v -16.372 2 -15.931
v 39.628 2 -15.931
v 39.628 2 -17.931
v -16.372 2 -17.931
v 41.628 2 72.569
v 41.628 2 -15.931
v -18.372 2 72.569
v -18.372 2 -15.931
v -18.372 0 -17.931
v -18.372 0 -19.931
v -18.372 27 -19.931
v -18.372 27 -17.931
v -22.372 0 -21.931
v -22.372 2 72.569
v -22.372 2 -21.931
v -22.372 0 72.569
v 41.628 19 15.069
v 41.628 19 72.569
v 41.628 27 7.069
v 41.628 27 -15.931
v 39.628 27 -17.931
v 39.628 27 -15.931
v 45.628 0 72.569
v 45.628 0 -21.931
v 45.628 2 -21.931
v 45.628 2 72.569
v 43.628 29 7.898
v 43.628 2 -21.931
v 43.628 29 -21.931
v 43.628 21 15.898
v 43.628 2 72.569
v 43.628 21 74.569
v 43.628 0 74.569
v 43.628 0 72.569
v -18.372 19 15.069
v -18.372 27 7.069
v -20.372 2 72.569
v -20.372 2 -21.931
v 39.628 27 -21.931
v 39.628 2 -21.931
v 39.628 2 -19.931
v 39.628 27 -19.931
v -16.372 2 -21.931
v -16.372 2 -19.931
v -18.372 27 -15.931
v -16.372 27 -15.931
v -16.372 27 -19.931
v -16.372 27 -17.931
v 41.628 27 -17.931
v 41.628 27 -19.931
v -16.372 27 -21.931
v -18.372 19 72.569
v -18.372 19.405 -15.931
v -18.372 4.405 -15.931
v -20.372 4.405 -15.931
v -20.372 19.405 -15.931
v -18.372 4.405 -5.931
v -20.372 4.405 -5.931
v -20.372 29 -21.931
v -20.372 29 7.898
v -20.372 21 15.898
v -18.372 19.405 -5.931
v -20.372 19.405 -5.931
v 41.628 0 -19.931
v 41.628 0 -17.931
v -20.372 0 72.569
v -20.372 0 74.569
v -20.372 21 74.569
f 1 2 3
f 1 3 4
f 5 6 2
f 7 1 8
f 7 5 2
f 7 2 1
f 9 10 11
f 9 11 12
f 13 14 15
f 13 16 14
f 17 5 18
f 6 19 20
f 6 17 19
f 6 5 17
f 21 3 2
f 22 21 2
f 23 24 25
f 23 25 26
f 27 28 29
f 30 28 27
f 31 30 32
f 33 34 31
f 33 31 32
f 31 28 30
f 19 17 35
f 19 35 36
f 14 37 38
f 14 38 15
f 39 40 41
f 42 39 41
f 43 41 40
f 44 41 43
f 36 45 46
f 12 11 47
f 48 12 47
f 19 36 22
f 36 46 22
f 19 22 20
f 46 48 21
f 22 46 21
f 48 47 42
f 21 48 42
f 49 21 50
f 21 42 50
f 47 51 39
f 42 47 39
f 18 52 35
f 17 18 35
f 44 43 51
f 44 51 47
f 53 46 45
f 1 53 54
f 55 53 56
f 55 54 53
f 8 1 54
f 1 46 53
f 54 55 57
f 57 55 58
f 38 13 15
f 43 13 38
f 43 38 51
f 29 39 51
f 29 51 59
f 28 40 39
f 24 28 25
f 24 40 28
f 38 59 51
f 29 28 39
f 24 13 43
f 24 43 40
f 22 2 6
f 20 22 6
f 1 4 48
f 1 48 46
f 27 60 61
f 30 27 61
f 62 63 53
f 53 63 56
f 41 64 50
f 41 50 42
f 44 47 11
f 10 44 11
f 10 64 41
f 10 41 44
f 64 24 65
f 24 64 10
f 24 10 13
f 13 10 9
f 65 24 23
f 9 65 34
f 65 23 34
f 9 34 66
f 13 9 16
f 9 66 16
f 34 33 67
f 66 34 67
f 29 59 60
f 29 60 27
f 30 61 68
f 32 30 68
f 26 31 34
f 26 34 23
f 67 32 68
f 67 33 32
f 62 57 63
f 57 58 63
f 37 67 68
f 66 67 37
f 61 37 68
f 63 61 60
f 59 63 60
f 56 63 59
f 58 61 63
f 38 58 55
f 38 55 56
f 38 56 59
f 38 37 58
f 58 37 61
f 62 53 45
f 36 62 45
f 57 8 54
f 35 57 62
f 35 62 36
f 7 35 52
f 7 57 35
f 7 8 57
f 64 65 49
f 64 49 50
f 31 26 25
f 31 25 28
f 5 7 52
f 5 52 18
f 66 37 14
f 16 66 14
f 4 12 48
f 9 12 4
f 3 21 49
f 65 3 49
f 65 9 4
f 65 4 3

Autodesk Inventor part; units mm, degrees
sketch "Sketch1" plane through (0, 0, 0) normal (0, 1, 0) x (-1, 0, 0)
  line L0 (22.3723, -21.9307) -> (-45.6277, -21.9307)
  line L1 (-45.6277, -21.9307) -> (-45.6277, 74.5693)
  line L2 (-45.6277, 74.5693) -> (22.3723, 74.5693)
  line L3 (22.3723, 74.5693) -> (22.3723, -21.9307)
  point P0 (0, 0)
  dimension "d0" = 68
  dimension "d1" = 96.5
extrude "Extrusion1" add sketch "Sketch1" along normal blind 2
sketch "Sketch3" plane through (0, 2, 0) normal (0, 1, 0) x (1, 0, 0)
  line L0 (-20.3723, 21.9307) -> (43.6277, 21.9307)
  line L1 (43.6277, 21.9307) -> (43.6277, -72.5693)
  line L2 (-20.3723, -72.5693) -> (-20.3723, 21.9307)
  line L3 (45.6277, 21.9307) -> (-22.3723, 21.9307) projected
  line L4 (-22.3723, 21.9307) -> (-22.3723, -74.5693) projected
  line L5 (-22.3723, -74.5693) -> (45.6277, -74.5693) projected
  line L6 (45.6277, -74.5693) -> (45.6277, 21.9307) projected
  line L7 (-20.3723, -72.5693) -> (-20.3723, -74.5693)
  line L8 (-22.3723, -74.5693) -> (45.6277, -74.5693) projected
  line L9 (43.6277, -74.5693) -> (43.6277, -72.5693)
  line L10 (-18.3723, -72.5693) -> (41.6277, -72.5693)
  line L11 (41.6277, -72.5693) -> (41.6277, 21.9307)
  line L12 (41.6277, 21.9307) -> (-18.3723, 21.9307)
  line L13 (-18.3723, 21.9307) -> (-18.3723, -72.5693)
  point P0 (0, 0)
  dimension "d4" = 0
  dimension "d5" = 2
  dimension "d7" = 2
  dimension "d8" = 0
  dimension "d9" = 2
  dimension "d10" = 2
  dimension "d11" = 2
extrude "Extrusion2" add sketch "Sketch3" along normal blind 25 contours L0 L13 L10 L11 L1 L9 L5 L7 L2
sketch "Sketch4" plane through (0, 27, 0) normal (0, 1, 0) x (1, 0, 0)
  line L0 (41.6277, 21.9307) -> (41.6277, -72.5693) projected
  line L1 (41.6277, -72.5693) -> (-18.3723, -72.5693) projected
  line L2 (-18.3723, -72.5693) -> (-18.3723, 21.9307) projected
  line L3 (-18.3723, 21.9307) -> (-20.3723, 21.9307) projected
  line L4 (-20.3723, 21.9307) -> (-20.3723, -74.5693) projected
  line L5 (-20.3723, -74.5693) -> (43.6277, -74.5693) projected
  line L6 (43.6277, -74.5693) -> (43.6277, 21.9307) projected
  line L7 (43.6277, 21.9307) -> (41.6277, 21.9307) projected
  line L8 (-20.3723, 21.9307) -> (43.6277, 21.9307)
  line L9 (43.6277, 21.9307) -> (43.6277, -74.5693)
  line L10 (43.6277, -74.5693) -> (-20.3723, -74.5693)
  line L11 (-20.3723, -74.5693) -> (-20.3723, 21.9307)
  point P0 (0, 0)
extrude "Extrusion3" add sketch "Sketch4" along normal blind 2
sketch "Sketch5" plane through (0, 2, 0) normal (0, 1, 0) x (1, 0, 0)
  line L0 (43.6277, 21.9307) -> (43.6277, -74.5693) projected
  line L1 (43.6277, -74.5693) -> (45.6277, -74.5693) projected
  line L2 (45.6277, -74.5693) -> (45.6277, 21.9307) projected
  line L3 (45.6277, 21.9307) -> (43.6277, 21.9307) projected
  line L4 (-20.3723, -74.5693) -> (-20.3723, 21.9307) projected
  line L5 (-20.3723, 21.9307) -> (-22.3723, 21.9307) projected
  line L6 (-22.3723, 21.9307) -> (-22.3723, -74.5693) projected
  line L7 (-22.3723, -74.5693) -> (-20.3723, -74.5693) projected
  line L8 (-22.3723, -74.5693) -> (-20.3723, -74.5693)
  line L9 (-20.3723, -74.5693) -> (-20.3723, -72.5693)
  line L10 (-20.3723, -72.5693) -> (-22.3723, -72.5693)
  line L11 (-22.3723, -72.5693) -> (-22.3723, -74.5693)
  line L12 (43.6277, -74.5693) -> (43.6277, 21.9307) projected
  line L13 (45.6277, -74.5693) -> (43.6277, -74.5693)
  line L14 (43.6277, -74.5693) -> (43.6277, -72.5693)
  line L15 (43.6277, -72.5693) -> (45.6277, -72.5693)
  line L16 (45.6277, -72.5693) -> (45.6277, -74.5693)
  point P0 (0, 0)
  dimension "d16" = 2
  dimension "d17" = 2
extrude "Extrusion4" cut sketch "Sketch5" against normal blind 2 contours L15 L2 L1 L0 | L7 L6 L10 L4
sketch "Sketch6" plane through (-20.3723, 0, 74.5693) normal (-1, 0, 0) x (0, 0, 1)
  line L0 (-96.5, 29) -> (-69.5, 29)
  line L1 (-96.5, 29) -> (0, 29) projected
  line L2 (0, 0) -> (0, 29) projected
  line L3 (0, 19) -> (-59.5, 19)
  line L4 (-69.5, 29) -> (-59.5, 19)
  line L5 (-69.5, 29) -> (-55.3579, 29) construction
  line L6 (-69.5, 29) -> (0, 29)
  line L7 (0, 29) -> (0, 19)
  point P0 (-74.5693, 0)
  dimension "d20" = 27
  dimension "d21" = 10
  dimension "d22" = 45
extrude "Extrusion5" cut sketch "Sketch6" against normal up to next
sketch "Sketch7" plane through (-20.3723, 2, -21.9307) normal (-1, 0, 0) x (0, 0, 1)
  line L0 (37, 17) -> (27, 27) projected
  line L1 (96.5, 17) -> (37, 17) projected
  line L2 (29.8284, 27) -> (37.8284, 19)
  line L3 (37.8284, 19) -> (96.5, 19)
  line L4 (27, 27) -> (29.8284, 27)
  line L5 (96.5, 17) -> (96.5, 19)
  point P0 (21.9307, -2)
  dimension "d25" = 2
extrude "Extrusion6" add sketch "Sketch7" against normal up to surface (64 mm away)
sketch "Sketch13" plane through (-20.3723, 2, -21.9307) normal (-1, 0, 0) x (0, 0, 1)
  line L0 (6, 2.4048) -> (16, 2.4048)
  line L1 (16, 2.4048) -> (16, 17.4048)
  line L2 (16, 17.4048) -> (6, 17.4048)
  line L3 (6, 17.4048) -> (6, 2.4048)
  line L4 (0, 0) -> (0, 27) projected
  point P0 (21.9307, -2)
  dimension "d46" = 10
  dimension "d47" = 15
  dimension "d50" = 6
extrude "Extrusion7" cut sketch "Sketch13" against normal blind 2
sketch "Sketch14" plane through (0, 0, 0) normal (0, -1, 0) x (1, 0, 0)
  line L0 (-18.3723, 7.0693) -> (-18.3723, -21.9307) projected
  line L1 (41.6277, -21.9307) -> (41.6277, 7.0693) projected
  line L2 (-18.3723, -21.9307) -> (-16.3723, -21.9307)
  line L3 (-16.3723, -21.9307) -> (-16.3723, -19.9307)
  line L4 (-16.3723, -19.9307) -> (-18.3723, -19.9307)
  line L5 (-18.3723, -19.9307) -> (-18.3723, -21.9307)
  line L6 (-18.3723, -17.9307) -> (-16.3723, -17.9307)
  line L7 (-16.3723, -17.9307) -> (-16.3723, -15.9307)
  line L8 (-16.3723, -15.9307) -> (-18.3723, -15.9307)
  line L9 (-18.3723, -15.9307) -> (-18.3723, -17.9307)
  line L10 (-22.3723, -21.9307) -> (45.6277, -21.9307) projected
  line L11 (11.6277, -21.9307) -> (11.6277, 0)
  line L12 (39.6277, -21.9307) -> (39.6277, -19.9307)
  line L13 (39.6277, -19.9307) -> (41.6277, -19.9307)
  line L14 (41.6277, -17.9307) -> (39.6277, -17.9307)
  line L15 (39.6277, -17.9307) -> (39.6277, -15.9307)
  line L16 (39.6277, -15.9307) -> (41.6277, -15.9307)
  line L17 (39.6277, -21.9307) -> (41.6277, -21.9307)
  line L18 (41.6277, -19.9307) -> (41.6277, -21.9307)
  line L19 (41.6277, -17.9307) -> (41.6277, -15.9307)
  line L20 (41.6277, -19.9307) -> (41.6277, -17.9307)
  line L21 (39.6277, -17.9307) -> (39.6277, -19.9307)
  line L22 (-16.3723, -19.9307) -> (-16.3723, -17.9307)
  line L23 (-18.3723, -17.9307) -> (-18.3723, -19.9307)
  line L24 (-18.3723, -19.9307) -> (-16.3723, -19.9307)
  line L25 (-16.3723, -19.9307) -> (39.6277, -19.9307)
  line L26 (41.6277, 72.5693) -> (41.6277, -21.9307) projected
  line L27 (39.6277, -17.9307) -> (-16.3723, -17.9307)
  point P0 (0, 0)
  dimension "d51" = 2
  dimension "d52" = 2
  dimension "d53" = 2
  dimension "d54" = 2
  dimension "d55" = 2
extrude "Extrusion8" add sketch "Sketch14" against normal up to surface (27 mm away) contours L8 L7 L6 L0 | L4 L3 L2 L0 | L15 L16 L1 L14 | L13 L1 L10 L12
extrude "Extrusion10" cut sketch "Sketch14" against normal up to next contours L6 L22 L4 L0 | L27 L11 L25 L22 | L27 L21 L25 L11 | L14 L1 L13 L21
properties part number "batteri"
